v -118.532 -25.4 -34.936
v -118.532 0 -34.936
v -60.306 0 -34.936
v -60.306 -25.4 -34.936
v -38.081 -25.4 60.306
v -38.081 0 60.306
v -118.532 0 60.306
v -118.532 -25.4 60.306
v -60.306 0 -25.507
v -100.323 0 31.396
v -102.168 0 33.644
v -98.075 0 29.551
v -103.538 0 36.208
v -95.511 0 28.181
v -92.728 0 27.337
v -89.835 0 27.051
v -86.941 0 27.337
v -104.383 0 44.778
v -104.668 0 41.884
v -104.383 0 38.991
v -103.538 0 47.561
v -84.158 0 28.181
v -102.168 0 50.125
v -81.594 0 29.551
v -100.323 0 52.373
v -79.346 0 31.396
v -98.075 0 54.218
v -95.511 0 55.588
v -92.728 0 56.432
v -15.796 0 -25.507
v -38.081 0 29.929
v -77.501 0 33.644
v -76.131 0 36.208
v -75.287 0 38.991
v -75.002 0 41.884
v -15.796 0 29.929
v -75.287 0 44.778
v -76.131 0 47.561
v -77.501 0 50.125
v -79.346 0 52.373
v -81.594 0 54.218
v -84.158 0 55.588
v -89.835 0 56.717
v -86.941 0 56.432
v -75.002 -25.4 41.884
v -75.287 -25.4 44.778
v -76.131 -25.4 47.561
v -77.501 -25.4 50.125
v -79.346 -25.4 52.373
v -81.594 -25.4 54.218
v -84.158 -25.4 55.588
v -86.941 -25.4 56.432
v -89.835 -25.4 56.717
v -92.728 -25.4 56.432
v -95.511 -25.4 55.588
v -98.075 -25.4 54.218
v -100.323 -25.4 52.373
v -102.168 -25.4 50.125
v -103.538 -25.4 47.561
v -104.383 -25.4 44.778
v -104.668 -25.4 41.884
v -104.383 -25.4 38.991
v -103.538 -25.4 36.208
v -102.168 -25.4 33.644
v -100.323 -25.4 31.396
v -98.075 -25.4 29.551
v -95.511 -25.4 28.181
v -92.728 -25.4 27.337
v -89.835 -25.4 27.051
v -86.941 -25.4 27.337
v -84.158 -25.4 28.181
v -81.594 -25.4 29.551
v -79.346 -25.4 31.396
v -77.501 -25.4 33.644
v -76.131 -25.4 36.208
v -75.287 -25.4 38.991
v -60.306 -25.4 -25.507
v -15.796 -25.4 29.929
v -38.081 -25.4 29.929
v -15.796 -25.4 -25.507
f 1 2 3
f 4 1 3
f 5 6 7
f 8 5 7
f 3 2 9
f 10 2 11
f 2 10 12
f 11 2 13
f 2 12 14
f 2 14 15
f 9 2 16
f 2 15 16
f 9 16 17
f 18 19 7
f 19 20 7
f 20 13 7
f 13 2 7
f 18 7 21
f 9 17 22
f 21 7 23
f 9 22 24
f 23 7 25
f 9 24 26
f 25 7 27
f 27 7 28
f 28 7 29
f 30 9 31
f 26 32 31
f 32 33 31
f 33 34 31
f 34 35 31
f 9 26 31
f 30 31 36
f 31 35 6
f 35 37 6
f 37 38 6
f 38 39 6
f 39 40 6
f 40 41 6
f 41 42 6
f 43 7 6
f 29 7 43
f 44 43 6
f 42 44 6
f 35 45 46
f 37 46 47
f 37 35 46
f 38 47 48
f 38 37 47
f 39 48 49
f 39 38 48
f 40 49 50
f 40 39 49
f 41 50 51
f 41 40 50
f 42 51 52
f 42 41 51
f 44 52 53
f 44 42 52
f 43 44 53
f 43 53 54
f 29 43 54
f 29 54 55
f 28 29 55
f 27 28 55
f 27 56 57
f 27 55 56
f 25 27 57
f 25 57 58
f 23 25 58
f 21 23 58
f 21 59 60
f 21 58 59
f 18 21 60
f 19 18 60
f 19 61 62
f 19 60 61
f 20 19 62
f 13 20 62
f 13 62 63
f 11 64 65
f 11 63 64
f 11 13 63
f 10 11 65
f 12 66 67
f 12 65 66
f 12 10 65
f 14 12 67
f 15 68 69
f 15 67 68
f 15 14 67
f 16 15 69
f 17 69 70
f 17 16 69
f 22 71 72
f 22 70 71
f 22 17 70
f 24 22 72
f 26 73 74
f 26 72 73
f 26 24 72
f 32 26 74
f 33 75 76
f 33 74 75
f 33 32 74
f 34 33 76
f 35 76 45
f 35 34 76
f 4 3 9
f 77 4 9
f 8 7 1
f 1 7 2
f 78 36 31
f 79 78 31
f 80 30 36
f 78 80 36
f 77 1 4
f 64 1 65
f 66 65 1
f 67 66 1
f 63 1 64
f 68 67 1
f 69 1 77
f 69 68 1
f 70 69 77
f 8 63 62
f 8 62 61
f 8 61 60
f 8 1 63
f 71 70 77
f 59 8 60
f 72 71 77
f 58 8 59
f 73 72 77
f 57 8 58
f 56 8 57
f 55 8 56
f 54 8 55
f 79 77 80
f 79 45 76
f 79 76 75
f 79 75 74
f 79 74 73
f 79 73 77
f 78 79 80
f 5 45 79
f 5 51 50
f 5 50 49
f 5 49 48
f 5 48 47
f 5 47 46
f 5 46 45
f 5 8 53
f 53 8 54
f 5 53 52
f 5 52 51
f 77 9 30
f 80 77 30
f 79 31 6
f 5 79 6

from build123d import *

# Parameters (mm, degrees)
F0_W     = 22.224892
F0_H     = 30.376296
F1_DEPTH = 25.4
F2_R     = 14.832934
F3_DEPTH = 25.401


with BuildPart() as f1:
    # F0 (on Front) → F1 (new body)
    with BuildSketch(Plane.XZ):
        Polygon((-60.305666, 60.30567), (-118.531823, 60.30567), (-118.531823, -34.93569), (-60.305666, -34.93569), (-60.305666, -25.506545), (-60.305666, 29.929374), align=None)
        Polygon((-38.080774, 29.929374), (-60.305666, 29.929374), (-60.305666, -25.506545), (-15.796112, -25.506545), (-15.796112, 29.929374), align=None)
        with Locations((-49.19322, 45.117522)):
            Rectangle(F0_W, F0_H)
    extrude(amount=F1_DEPTH)

    # F2 (on Front) → F3 (cut, through all)
    with BuildSketch(Plane.XZ):
        with Locations((-89.834586, 41.88443)):
            Circle(F2_R)
    extrude(amount=F3_DEPTH, mode=Mode.SUBTRACT)


solid = f1.part
